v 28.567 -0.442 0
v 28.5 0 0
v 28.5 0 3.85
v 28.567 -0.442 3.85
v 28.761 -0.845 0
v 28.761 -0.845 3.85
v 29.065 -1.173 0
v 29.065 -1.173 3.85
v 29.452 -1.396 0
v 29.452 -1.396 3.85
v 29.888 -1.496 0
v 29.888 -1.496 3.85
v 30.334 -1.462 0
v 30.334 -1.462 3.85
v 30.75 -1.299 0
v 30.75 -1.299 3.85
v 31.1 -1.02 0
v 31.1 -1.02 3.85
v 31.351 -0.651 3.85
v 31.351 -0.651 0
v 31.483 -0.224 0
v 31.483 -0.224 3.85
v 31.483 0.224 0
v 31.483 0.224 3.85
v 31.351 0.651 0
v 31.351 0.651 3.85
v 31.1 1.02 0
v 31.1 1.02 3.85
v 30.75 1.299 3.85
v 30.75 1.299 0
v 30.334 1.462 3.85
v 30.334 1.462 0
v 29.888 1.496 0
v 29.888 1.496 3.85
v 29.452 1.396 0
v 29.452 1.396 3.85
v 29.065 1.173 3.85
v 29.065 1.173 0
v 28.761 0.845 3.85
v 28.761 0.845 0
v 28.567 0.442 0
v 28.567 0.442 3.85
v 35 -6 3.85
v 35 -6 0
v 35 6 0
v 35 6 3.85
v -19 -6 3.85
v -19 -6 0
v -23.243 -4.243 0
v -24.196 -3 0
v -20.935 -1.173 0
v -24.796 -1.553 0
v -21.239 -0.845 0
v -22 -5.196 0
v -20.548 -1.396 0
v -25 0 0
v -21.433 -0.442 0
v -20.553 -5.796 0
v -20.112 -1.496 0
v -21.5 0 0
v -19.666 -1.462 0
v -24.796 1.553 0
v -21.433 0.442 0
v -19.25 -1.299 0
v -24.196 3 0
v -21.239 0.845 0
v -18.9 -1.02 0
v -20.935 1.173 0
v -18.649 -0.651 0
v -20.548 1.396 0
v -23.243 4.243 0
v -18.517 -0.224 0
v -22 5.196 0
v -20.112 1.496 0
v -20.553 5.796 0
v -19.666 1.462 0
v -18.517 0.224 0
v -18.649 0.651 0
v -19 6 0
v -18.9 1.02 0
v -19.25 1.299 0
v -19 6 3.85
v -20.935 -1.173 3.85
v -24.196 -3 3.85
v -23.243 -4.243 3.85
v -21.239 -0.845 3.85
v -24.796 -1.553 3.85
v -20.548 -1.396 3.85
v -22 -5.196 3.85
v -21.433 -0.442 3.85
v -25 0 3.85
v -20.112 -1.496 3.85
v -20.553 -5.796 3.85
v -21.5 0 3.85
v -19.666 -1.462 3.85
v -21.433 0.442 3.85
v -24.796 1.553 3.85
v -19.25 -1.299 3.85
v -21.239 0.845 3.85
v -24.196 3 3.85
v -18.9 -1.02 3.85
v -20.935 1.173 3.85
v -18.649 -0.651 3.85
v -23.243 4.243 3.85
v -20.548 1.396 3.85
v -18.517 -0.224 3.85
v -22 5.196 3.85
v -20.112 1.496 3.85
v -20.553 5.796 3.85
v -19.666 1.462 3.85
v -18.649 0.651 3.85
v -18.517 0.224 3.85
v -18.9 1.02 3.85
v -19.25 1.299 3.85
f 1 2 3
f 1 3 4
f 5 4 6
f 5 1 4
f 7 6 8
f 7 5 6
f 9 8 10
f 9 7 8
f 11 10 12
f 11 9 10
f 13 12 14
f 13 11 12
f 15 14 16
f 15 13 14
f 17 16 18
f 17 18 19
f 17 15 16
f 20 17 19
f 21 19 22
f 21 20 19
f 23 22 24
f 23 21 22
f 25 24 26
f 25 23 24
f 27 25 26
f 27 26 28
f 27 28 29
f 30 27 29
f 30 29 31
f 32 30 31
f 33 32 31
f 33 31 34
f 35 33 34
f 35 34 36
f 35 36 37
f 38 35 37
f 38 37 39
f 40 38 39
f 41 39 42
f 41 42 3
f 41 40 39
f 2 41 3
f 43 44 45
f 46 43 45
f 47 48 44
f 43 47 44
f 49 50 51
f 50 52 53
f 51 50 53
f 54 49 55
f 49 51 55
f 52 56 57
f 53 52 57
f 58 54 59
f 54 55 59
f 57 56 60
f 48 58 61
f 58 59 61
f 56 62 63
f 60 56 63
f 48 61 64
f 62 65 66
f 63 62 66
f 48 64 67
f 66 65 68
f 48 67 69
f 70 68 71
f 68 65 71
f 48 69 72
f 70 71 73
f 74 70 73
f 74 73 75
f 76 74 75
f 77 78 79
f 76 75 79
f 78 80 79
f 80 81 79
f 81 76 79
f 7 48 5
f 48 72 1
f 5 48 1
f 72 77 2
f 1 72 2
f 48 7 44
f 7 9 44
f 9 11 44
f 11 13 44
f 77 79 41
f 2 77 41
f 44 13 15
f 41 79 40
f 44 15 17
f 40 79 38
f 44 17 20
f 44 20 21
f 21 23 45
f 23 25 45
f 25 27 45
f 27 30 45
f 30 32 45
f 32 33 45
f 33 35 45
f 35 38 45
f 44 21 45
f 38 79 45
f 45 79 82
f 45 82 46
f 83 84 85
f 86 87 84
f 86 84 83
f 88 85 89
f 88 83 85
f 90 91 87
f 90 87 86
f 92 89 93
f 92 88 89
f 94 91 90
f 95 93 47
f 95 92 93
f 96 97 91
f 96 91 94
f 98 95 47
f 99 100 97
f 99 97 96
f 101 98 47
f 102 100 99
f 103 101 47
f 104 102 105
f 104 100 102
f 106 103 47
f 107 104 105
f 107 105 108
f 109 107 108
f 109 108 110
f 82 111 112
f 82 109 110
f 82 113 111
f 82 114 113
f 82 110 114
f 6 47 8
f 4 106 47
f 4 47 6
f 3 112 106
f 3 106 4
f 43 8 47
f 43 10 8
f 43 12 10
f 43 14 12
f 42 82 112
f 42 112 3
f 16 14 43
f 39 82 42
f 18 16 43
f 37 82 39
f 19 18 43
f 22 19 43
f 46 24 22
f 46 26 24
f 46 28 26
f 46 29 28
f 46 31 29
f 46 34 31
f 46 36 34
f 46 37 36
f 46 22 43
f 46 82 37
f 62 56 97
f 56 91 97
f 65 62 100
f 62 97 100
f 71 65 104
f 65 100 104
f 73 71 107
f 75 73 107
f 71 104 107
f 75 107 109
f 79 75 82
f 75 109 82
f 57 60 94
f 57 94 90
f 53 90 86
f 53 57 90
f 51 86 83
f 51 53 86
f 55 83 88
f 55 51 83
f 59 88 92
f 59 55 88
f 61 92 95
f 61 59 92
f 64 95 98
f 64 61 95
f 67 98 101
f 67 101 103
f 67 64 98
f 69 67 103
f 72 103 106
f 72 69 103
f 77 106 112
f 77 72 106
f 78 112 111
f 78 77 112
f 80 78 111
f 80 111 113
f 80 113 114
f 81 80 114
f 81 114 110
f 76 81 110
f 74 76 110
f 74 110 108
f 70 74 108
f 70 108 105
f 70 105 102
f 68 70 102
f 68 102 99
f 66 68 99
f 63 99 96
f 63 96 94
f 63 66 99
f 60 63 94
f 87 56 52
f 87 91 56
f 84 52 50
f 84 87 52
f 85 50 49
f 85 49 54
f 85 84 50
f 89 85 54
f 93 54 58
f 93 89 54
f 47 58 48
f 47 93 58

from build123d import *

# Parameters (mm, degrees)
SKETCH_1_W      = 60
SKETCH_1_H      = 12
SKETCH_1_R      = 1.5
EXTRUDE_1_DEPTH = 3.85
FILLET_1_R      = 6


with BuildPart() as part:
    # 草图1 → 凸台-拉伸1 (new body)
    with BuildSketch(Plane.XY):
        with Locations((5, 0)):
            Rectangle(SKETCH_1_W, SKETCH_1_H)
        with Locations(Location((-20, 0, 0), (0, 0, 180))):
            Circle(SKETCH_1_R, mode=Mode.SUBTRACT)
        with Locations(Location((30, 0, 0), (0, 0, 180))):
            Circle(SKETCH_1_R, mode=Mode.SUBTRACT)
    extrude(amount=EXTRUDE_1_DEPTH)

    # 圆角1
    fillet_1_edges = [part.edges().sort_by_distance(p)[0] for p in [
        (-25, -6, 1.925),
        (-25, 6, 1.925),
    ]]
    fillet(fillet_1_edges, radius=FILLET_1_R - 0.0001)  # a hair under: the kernel refuses the full size


solid = part.part
